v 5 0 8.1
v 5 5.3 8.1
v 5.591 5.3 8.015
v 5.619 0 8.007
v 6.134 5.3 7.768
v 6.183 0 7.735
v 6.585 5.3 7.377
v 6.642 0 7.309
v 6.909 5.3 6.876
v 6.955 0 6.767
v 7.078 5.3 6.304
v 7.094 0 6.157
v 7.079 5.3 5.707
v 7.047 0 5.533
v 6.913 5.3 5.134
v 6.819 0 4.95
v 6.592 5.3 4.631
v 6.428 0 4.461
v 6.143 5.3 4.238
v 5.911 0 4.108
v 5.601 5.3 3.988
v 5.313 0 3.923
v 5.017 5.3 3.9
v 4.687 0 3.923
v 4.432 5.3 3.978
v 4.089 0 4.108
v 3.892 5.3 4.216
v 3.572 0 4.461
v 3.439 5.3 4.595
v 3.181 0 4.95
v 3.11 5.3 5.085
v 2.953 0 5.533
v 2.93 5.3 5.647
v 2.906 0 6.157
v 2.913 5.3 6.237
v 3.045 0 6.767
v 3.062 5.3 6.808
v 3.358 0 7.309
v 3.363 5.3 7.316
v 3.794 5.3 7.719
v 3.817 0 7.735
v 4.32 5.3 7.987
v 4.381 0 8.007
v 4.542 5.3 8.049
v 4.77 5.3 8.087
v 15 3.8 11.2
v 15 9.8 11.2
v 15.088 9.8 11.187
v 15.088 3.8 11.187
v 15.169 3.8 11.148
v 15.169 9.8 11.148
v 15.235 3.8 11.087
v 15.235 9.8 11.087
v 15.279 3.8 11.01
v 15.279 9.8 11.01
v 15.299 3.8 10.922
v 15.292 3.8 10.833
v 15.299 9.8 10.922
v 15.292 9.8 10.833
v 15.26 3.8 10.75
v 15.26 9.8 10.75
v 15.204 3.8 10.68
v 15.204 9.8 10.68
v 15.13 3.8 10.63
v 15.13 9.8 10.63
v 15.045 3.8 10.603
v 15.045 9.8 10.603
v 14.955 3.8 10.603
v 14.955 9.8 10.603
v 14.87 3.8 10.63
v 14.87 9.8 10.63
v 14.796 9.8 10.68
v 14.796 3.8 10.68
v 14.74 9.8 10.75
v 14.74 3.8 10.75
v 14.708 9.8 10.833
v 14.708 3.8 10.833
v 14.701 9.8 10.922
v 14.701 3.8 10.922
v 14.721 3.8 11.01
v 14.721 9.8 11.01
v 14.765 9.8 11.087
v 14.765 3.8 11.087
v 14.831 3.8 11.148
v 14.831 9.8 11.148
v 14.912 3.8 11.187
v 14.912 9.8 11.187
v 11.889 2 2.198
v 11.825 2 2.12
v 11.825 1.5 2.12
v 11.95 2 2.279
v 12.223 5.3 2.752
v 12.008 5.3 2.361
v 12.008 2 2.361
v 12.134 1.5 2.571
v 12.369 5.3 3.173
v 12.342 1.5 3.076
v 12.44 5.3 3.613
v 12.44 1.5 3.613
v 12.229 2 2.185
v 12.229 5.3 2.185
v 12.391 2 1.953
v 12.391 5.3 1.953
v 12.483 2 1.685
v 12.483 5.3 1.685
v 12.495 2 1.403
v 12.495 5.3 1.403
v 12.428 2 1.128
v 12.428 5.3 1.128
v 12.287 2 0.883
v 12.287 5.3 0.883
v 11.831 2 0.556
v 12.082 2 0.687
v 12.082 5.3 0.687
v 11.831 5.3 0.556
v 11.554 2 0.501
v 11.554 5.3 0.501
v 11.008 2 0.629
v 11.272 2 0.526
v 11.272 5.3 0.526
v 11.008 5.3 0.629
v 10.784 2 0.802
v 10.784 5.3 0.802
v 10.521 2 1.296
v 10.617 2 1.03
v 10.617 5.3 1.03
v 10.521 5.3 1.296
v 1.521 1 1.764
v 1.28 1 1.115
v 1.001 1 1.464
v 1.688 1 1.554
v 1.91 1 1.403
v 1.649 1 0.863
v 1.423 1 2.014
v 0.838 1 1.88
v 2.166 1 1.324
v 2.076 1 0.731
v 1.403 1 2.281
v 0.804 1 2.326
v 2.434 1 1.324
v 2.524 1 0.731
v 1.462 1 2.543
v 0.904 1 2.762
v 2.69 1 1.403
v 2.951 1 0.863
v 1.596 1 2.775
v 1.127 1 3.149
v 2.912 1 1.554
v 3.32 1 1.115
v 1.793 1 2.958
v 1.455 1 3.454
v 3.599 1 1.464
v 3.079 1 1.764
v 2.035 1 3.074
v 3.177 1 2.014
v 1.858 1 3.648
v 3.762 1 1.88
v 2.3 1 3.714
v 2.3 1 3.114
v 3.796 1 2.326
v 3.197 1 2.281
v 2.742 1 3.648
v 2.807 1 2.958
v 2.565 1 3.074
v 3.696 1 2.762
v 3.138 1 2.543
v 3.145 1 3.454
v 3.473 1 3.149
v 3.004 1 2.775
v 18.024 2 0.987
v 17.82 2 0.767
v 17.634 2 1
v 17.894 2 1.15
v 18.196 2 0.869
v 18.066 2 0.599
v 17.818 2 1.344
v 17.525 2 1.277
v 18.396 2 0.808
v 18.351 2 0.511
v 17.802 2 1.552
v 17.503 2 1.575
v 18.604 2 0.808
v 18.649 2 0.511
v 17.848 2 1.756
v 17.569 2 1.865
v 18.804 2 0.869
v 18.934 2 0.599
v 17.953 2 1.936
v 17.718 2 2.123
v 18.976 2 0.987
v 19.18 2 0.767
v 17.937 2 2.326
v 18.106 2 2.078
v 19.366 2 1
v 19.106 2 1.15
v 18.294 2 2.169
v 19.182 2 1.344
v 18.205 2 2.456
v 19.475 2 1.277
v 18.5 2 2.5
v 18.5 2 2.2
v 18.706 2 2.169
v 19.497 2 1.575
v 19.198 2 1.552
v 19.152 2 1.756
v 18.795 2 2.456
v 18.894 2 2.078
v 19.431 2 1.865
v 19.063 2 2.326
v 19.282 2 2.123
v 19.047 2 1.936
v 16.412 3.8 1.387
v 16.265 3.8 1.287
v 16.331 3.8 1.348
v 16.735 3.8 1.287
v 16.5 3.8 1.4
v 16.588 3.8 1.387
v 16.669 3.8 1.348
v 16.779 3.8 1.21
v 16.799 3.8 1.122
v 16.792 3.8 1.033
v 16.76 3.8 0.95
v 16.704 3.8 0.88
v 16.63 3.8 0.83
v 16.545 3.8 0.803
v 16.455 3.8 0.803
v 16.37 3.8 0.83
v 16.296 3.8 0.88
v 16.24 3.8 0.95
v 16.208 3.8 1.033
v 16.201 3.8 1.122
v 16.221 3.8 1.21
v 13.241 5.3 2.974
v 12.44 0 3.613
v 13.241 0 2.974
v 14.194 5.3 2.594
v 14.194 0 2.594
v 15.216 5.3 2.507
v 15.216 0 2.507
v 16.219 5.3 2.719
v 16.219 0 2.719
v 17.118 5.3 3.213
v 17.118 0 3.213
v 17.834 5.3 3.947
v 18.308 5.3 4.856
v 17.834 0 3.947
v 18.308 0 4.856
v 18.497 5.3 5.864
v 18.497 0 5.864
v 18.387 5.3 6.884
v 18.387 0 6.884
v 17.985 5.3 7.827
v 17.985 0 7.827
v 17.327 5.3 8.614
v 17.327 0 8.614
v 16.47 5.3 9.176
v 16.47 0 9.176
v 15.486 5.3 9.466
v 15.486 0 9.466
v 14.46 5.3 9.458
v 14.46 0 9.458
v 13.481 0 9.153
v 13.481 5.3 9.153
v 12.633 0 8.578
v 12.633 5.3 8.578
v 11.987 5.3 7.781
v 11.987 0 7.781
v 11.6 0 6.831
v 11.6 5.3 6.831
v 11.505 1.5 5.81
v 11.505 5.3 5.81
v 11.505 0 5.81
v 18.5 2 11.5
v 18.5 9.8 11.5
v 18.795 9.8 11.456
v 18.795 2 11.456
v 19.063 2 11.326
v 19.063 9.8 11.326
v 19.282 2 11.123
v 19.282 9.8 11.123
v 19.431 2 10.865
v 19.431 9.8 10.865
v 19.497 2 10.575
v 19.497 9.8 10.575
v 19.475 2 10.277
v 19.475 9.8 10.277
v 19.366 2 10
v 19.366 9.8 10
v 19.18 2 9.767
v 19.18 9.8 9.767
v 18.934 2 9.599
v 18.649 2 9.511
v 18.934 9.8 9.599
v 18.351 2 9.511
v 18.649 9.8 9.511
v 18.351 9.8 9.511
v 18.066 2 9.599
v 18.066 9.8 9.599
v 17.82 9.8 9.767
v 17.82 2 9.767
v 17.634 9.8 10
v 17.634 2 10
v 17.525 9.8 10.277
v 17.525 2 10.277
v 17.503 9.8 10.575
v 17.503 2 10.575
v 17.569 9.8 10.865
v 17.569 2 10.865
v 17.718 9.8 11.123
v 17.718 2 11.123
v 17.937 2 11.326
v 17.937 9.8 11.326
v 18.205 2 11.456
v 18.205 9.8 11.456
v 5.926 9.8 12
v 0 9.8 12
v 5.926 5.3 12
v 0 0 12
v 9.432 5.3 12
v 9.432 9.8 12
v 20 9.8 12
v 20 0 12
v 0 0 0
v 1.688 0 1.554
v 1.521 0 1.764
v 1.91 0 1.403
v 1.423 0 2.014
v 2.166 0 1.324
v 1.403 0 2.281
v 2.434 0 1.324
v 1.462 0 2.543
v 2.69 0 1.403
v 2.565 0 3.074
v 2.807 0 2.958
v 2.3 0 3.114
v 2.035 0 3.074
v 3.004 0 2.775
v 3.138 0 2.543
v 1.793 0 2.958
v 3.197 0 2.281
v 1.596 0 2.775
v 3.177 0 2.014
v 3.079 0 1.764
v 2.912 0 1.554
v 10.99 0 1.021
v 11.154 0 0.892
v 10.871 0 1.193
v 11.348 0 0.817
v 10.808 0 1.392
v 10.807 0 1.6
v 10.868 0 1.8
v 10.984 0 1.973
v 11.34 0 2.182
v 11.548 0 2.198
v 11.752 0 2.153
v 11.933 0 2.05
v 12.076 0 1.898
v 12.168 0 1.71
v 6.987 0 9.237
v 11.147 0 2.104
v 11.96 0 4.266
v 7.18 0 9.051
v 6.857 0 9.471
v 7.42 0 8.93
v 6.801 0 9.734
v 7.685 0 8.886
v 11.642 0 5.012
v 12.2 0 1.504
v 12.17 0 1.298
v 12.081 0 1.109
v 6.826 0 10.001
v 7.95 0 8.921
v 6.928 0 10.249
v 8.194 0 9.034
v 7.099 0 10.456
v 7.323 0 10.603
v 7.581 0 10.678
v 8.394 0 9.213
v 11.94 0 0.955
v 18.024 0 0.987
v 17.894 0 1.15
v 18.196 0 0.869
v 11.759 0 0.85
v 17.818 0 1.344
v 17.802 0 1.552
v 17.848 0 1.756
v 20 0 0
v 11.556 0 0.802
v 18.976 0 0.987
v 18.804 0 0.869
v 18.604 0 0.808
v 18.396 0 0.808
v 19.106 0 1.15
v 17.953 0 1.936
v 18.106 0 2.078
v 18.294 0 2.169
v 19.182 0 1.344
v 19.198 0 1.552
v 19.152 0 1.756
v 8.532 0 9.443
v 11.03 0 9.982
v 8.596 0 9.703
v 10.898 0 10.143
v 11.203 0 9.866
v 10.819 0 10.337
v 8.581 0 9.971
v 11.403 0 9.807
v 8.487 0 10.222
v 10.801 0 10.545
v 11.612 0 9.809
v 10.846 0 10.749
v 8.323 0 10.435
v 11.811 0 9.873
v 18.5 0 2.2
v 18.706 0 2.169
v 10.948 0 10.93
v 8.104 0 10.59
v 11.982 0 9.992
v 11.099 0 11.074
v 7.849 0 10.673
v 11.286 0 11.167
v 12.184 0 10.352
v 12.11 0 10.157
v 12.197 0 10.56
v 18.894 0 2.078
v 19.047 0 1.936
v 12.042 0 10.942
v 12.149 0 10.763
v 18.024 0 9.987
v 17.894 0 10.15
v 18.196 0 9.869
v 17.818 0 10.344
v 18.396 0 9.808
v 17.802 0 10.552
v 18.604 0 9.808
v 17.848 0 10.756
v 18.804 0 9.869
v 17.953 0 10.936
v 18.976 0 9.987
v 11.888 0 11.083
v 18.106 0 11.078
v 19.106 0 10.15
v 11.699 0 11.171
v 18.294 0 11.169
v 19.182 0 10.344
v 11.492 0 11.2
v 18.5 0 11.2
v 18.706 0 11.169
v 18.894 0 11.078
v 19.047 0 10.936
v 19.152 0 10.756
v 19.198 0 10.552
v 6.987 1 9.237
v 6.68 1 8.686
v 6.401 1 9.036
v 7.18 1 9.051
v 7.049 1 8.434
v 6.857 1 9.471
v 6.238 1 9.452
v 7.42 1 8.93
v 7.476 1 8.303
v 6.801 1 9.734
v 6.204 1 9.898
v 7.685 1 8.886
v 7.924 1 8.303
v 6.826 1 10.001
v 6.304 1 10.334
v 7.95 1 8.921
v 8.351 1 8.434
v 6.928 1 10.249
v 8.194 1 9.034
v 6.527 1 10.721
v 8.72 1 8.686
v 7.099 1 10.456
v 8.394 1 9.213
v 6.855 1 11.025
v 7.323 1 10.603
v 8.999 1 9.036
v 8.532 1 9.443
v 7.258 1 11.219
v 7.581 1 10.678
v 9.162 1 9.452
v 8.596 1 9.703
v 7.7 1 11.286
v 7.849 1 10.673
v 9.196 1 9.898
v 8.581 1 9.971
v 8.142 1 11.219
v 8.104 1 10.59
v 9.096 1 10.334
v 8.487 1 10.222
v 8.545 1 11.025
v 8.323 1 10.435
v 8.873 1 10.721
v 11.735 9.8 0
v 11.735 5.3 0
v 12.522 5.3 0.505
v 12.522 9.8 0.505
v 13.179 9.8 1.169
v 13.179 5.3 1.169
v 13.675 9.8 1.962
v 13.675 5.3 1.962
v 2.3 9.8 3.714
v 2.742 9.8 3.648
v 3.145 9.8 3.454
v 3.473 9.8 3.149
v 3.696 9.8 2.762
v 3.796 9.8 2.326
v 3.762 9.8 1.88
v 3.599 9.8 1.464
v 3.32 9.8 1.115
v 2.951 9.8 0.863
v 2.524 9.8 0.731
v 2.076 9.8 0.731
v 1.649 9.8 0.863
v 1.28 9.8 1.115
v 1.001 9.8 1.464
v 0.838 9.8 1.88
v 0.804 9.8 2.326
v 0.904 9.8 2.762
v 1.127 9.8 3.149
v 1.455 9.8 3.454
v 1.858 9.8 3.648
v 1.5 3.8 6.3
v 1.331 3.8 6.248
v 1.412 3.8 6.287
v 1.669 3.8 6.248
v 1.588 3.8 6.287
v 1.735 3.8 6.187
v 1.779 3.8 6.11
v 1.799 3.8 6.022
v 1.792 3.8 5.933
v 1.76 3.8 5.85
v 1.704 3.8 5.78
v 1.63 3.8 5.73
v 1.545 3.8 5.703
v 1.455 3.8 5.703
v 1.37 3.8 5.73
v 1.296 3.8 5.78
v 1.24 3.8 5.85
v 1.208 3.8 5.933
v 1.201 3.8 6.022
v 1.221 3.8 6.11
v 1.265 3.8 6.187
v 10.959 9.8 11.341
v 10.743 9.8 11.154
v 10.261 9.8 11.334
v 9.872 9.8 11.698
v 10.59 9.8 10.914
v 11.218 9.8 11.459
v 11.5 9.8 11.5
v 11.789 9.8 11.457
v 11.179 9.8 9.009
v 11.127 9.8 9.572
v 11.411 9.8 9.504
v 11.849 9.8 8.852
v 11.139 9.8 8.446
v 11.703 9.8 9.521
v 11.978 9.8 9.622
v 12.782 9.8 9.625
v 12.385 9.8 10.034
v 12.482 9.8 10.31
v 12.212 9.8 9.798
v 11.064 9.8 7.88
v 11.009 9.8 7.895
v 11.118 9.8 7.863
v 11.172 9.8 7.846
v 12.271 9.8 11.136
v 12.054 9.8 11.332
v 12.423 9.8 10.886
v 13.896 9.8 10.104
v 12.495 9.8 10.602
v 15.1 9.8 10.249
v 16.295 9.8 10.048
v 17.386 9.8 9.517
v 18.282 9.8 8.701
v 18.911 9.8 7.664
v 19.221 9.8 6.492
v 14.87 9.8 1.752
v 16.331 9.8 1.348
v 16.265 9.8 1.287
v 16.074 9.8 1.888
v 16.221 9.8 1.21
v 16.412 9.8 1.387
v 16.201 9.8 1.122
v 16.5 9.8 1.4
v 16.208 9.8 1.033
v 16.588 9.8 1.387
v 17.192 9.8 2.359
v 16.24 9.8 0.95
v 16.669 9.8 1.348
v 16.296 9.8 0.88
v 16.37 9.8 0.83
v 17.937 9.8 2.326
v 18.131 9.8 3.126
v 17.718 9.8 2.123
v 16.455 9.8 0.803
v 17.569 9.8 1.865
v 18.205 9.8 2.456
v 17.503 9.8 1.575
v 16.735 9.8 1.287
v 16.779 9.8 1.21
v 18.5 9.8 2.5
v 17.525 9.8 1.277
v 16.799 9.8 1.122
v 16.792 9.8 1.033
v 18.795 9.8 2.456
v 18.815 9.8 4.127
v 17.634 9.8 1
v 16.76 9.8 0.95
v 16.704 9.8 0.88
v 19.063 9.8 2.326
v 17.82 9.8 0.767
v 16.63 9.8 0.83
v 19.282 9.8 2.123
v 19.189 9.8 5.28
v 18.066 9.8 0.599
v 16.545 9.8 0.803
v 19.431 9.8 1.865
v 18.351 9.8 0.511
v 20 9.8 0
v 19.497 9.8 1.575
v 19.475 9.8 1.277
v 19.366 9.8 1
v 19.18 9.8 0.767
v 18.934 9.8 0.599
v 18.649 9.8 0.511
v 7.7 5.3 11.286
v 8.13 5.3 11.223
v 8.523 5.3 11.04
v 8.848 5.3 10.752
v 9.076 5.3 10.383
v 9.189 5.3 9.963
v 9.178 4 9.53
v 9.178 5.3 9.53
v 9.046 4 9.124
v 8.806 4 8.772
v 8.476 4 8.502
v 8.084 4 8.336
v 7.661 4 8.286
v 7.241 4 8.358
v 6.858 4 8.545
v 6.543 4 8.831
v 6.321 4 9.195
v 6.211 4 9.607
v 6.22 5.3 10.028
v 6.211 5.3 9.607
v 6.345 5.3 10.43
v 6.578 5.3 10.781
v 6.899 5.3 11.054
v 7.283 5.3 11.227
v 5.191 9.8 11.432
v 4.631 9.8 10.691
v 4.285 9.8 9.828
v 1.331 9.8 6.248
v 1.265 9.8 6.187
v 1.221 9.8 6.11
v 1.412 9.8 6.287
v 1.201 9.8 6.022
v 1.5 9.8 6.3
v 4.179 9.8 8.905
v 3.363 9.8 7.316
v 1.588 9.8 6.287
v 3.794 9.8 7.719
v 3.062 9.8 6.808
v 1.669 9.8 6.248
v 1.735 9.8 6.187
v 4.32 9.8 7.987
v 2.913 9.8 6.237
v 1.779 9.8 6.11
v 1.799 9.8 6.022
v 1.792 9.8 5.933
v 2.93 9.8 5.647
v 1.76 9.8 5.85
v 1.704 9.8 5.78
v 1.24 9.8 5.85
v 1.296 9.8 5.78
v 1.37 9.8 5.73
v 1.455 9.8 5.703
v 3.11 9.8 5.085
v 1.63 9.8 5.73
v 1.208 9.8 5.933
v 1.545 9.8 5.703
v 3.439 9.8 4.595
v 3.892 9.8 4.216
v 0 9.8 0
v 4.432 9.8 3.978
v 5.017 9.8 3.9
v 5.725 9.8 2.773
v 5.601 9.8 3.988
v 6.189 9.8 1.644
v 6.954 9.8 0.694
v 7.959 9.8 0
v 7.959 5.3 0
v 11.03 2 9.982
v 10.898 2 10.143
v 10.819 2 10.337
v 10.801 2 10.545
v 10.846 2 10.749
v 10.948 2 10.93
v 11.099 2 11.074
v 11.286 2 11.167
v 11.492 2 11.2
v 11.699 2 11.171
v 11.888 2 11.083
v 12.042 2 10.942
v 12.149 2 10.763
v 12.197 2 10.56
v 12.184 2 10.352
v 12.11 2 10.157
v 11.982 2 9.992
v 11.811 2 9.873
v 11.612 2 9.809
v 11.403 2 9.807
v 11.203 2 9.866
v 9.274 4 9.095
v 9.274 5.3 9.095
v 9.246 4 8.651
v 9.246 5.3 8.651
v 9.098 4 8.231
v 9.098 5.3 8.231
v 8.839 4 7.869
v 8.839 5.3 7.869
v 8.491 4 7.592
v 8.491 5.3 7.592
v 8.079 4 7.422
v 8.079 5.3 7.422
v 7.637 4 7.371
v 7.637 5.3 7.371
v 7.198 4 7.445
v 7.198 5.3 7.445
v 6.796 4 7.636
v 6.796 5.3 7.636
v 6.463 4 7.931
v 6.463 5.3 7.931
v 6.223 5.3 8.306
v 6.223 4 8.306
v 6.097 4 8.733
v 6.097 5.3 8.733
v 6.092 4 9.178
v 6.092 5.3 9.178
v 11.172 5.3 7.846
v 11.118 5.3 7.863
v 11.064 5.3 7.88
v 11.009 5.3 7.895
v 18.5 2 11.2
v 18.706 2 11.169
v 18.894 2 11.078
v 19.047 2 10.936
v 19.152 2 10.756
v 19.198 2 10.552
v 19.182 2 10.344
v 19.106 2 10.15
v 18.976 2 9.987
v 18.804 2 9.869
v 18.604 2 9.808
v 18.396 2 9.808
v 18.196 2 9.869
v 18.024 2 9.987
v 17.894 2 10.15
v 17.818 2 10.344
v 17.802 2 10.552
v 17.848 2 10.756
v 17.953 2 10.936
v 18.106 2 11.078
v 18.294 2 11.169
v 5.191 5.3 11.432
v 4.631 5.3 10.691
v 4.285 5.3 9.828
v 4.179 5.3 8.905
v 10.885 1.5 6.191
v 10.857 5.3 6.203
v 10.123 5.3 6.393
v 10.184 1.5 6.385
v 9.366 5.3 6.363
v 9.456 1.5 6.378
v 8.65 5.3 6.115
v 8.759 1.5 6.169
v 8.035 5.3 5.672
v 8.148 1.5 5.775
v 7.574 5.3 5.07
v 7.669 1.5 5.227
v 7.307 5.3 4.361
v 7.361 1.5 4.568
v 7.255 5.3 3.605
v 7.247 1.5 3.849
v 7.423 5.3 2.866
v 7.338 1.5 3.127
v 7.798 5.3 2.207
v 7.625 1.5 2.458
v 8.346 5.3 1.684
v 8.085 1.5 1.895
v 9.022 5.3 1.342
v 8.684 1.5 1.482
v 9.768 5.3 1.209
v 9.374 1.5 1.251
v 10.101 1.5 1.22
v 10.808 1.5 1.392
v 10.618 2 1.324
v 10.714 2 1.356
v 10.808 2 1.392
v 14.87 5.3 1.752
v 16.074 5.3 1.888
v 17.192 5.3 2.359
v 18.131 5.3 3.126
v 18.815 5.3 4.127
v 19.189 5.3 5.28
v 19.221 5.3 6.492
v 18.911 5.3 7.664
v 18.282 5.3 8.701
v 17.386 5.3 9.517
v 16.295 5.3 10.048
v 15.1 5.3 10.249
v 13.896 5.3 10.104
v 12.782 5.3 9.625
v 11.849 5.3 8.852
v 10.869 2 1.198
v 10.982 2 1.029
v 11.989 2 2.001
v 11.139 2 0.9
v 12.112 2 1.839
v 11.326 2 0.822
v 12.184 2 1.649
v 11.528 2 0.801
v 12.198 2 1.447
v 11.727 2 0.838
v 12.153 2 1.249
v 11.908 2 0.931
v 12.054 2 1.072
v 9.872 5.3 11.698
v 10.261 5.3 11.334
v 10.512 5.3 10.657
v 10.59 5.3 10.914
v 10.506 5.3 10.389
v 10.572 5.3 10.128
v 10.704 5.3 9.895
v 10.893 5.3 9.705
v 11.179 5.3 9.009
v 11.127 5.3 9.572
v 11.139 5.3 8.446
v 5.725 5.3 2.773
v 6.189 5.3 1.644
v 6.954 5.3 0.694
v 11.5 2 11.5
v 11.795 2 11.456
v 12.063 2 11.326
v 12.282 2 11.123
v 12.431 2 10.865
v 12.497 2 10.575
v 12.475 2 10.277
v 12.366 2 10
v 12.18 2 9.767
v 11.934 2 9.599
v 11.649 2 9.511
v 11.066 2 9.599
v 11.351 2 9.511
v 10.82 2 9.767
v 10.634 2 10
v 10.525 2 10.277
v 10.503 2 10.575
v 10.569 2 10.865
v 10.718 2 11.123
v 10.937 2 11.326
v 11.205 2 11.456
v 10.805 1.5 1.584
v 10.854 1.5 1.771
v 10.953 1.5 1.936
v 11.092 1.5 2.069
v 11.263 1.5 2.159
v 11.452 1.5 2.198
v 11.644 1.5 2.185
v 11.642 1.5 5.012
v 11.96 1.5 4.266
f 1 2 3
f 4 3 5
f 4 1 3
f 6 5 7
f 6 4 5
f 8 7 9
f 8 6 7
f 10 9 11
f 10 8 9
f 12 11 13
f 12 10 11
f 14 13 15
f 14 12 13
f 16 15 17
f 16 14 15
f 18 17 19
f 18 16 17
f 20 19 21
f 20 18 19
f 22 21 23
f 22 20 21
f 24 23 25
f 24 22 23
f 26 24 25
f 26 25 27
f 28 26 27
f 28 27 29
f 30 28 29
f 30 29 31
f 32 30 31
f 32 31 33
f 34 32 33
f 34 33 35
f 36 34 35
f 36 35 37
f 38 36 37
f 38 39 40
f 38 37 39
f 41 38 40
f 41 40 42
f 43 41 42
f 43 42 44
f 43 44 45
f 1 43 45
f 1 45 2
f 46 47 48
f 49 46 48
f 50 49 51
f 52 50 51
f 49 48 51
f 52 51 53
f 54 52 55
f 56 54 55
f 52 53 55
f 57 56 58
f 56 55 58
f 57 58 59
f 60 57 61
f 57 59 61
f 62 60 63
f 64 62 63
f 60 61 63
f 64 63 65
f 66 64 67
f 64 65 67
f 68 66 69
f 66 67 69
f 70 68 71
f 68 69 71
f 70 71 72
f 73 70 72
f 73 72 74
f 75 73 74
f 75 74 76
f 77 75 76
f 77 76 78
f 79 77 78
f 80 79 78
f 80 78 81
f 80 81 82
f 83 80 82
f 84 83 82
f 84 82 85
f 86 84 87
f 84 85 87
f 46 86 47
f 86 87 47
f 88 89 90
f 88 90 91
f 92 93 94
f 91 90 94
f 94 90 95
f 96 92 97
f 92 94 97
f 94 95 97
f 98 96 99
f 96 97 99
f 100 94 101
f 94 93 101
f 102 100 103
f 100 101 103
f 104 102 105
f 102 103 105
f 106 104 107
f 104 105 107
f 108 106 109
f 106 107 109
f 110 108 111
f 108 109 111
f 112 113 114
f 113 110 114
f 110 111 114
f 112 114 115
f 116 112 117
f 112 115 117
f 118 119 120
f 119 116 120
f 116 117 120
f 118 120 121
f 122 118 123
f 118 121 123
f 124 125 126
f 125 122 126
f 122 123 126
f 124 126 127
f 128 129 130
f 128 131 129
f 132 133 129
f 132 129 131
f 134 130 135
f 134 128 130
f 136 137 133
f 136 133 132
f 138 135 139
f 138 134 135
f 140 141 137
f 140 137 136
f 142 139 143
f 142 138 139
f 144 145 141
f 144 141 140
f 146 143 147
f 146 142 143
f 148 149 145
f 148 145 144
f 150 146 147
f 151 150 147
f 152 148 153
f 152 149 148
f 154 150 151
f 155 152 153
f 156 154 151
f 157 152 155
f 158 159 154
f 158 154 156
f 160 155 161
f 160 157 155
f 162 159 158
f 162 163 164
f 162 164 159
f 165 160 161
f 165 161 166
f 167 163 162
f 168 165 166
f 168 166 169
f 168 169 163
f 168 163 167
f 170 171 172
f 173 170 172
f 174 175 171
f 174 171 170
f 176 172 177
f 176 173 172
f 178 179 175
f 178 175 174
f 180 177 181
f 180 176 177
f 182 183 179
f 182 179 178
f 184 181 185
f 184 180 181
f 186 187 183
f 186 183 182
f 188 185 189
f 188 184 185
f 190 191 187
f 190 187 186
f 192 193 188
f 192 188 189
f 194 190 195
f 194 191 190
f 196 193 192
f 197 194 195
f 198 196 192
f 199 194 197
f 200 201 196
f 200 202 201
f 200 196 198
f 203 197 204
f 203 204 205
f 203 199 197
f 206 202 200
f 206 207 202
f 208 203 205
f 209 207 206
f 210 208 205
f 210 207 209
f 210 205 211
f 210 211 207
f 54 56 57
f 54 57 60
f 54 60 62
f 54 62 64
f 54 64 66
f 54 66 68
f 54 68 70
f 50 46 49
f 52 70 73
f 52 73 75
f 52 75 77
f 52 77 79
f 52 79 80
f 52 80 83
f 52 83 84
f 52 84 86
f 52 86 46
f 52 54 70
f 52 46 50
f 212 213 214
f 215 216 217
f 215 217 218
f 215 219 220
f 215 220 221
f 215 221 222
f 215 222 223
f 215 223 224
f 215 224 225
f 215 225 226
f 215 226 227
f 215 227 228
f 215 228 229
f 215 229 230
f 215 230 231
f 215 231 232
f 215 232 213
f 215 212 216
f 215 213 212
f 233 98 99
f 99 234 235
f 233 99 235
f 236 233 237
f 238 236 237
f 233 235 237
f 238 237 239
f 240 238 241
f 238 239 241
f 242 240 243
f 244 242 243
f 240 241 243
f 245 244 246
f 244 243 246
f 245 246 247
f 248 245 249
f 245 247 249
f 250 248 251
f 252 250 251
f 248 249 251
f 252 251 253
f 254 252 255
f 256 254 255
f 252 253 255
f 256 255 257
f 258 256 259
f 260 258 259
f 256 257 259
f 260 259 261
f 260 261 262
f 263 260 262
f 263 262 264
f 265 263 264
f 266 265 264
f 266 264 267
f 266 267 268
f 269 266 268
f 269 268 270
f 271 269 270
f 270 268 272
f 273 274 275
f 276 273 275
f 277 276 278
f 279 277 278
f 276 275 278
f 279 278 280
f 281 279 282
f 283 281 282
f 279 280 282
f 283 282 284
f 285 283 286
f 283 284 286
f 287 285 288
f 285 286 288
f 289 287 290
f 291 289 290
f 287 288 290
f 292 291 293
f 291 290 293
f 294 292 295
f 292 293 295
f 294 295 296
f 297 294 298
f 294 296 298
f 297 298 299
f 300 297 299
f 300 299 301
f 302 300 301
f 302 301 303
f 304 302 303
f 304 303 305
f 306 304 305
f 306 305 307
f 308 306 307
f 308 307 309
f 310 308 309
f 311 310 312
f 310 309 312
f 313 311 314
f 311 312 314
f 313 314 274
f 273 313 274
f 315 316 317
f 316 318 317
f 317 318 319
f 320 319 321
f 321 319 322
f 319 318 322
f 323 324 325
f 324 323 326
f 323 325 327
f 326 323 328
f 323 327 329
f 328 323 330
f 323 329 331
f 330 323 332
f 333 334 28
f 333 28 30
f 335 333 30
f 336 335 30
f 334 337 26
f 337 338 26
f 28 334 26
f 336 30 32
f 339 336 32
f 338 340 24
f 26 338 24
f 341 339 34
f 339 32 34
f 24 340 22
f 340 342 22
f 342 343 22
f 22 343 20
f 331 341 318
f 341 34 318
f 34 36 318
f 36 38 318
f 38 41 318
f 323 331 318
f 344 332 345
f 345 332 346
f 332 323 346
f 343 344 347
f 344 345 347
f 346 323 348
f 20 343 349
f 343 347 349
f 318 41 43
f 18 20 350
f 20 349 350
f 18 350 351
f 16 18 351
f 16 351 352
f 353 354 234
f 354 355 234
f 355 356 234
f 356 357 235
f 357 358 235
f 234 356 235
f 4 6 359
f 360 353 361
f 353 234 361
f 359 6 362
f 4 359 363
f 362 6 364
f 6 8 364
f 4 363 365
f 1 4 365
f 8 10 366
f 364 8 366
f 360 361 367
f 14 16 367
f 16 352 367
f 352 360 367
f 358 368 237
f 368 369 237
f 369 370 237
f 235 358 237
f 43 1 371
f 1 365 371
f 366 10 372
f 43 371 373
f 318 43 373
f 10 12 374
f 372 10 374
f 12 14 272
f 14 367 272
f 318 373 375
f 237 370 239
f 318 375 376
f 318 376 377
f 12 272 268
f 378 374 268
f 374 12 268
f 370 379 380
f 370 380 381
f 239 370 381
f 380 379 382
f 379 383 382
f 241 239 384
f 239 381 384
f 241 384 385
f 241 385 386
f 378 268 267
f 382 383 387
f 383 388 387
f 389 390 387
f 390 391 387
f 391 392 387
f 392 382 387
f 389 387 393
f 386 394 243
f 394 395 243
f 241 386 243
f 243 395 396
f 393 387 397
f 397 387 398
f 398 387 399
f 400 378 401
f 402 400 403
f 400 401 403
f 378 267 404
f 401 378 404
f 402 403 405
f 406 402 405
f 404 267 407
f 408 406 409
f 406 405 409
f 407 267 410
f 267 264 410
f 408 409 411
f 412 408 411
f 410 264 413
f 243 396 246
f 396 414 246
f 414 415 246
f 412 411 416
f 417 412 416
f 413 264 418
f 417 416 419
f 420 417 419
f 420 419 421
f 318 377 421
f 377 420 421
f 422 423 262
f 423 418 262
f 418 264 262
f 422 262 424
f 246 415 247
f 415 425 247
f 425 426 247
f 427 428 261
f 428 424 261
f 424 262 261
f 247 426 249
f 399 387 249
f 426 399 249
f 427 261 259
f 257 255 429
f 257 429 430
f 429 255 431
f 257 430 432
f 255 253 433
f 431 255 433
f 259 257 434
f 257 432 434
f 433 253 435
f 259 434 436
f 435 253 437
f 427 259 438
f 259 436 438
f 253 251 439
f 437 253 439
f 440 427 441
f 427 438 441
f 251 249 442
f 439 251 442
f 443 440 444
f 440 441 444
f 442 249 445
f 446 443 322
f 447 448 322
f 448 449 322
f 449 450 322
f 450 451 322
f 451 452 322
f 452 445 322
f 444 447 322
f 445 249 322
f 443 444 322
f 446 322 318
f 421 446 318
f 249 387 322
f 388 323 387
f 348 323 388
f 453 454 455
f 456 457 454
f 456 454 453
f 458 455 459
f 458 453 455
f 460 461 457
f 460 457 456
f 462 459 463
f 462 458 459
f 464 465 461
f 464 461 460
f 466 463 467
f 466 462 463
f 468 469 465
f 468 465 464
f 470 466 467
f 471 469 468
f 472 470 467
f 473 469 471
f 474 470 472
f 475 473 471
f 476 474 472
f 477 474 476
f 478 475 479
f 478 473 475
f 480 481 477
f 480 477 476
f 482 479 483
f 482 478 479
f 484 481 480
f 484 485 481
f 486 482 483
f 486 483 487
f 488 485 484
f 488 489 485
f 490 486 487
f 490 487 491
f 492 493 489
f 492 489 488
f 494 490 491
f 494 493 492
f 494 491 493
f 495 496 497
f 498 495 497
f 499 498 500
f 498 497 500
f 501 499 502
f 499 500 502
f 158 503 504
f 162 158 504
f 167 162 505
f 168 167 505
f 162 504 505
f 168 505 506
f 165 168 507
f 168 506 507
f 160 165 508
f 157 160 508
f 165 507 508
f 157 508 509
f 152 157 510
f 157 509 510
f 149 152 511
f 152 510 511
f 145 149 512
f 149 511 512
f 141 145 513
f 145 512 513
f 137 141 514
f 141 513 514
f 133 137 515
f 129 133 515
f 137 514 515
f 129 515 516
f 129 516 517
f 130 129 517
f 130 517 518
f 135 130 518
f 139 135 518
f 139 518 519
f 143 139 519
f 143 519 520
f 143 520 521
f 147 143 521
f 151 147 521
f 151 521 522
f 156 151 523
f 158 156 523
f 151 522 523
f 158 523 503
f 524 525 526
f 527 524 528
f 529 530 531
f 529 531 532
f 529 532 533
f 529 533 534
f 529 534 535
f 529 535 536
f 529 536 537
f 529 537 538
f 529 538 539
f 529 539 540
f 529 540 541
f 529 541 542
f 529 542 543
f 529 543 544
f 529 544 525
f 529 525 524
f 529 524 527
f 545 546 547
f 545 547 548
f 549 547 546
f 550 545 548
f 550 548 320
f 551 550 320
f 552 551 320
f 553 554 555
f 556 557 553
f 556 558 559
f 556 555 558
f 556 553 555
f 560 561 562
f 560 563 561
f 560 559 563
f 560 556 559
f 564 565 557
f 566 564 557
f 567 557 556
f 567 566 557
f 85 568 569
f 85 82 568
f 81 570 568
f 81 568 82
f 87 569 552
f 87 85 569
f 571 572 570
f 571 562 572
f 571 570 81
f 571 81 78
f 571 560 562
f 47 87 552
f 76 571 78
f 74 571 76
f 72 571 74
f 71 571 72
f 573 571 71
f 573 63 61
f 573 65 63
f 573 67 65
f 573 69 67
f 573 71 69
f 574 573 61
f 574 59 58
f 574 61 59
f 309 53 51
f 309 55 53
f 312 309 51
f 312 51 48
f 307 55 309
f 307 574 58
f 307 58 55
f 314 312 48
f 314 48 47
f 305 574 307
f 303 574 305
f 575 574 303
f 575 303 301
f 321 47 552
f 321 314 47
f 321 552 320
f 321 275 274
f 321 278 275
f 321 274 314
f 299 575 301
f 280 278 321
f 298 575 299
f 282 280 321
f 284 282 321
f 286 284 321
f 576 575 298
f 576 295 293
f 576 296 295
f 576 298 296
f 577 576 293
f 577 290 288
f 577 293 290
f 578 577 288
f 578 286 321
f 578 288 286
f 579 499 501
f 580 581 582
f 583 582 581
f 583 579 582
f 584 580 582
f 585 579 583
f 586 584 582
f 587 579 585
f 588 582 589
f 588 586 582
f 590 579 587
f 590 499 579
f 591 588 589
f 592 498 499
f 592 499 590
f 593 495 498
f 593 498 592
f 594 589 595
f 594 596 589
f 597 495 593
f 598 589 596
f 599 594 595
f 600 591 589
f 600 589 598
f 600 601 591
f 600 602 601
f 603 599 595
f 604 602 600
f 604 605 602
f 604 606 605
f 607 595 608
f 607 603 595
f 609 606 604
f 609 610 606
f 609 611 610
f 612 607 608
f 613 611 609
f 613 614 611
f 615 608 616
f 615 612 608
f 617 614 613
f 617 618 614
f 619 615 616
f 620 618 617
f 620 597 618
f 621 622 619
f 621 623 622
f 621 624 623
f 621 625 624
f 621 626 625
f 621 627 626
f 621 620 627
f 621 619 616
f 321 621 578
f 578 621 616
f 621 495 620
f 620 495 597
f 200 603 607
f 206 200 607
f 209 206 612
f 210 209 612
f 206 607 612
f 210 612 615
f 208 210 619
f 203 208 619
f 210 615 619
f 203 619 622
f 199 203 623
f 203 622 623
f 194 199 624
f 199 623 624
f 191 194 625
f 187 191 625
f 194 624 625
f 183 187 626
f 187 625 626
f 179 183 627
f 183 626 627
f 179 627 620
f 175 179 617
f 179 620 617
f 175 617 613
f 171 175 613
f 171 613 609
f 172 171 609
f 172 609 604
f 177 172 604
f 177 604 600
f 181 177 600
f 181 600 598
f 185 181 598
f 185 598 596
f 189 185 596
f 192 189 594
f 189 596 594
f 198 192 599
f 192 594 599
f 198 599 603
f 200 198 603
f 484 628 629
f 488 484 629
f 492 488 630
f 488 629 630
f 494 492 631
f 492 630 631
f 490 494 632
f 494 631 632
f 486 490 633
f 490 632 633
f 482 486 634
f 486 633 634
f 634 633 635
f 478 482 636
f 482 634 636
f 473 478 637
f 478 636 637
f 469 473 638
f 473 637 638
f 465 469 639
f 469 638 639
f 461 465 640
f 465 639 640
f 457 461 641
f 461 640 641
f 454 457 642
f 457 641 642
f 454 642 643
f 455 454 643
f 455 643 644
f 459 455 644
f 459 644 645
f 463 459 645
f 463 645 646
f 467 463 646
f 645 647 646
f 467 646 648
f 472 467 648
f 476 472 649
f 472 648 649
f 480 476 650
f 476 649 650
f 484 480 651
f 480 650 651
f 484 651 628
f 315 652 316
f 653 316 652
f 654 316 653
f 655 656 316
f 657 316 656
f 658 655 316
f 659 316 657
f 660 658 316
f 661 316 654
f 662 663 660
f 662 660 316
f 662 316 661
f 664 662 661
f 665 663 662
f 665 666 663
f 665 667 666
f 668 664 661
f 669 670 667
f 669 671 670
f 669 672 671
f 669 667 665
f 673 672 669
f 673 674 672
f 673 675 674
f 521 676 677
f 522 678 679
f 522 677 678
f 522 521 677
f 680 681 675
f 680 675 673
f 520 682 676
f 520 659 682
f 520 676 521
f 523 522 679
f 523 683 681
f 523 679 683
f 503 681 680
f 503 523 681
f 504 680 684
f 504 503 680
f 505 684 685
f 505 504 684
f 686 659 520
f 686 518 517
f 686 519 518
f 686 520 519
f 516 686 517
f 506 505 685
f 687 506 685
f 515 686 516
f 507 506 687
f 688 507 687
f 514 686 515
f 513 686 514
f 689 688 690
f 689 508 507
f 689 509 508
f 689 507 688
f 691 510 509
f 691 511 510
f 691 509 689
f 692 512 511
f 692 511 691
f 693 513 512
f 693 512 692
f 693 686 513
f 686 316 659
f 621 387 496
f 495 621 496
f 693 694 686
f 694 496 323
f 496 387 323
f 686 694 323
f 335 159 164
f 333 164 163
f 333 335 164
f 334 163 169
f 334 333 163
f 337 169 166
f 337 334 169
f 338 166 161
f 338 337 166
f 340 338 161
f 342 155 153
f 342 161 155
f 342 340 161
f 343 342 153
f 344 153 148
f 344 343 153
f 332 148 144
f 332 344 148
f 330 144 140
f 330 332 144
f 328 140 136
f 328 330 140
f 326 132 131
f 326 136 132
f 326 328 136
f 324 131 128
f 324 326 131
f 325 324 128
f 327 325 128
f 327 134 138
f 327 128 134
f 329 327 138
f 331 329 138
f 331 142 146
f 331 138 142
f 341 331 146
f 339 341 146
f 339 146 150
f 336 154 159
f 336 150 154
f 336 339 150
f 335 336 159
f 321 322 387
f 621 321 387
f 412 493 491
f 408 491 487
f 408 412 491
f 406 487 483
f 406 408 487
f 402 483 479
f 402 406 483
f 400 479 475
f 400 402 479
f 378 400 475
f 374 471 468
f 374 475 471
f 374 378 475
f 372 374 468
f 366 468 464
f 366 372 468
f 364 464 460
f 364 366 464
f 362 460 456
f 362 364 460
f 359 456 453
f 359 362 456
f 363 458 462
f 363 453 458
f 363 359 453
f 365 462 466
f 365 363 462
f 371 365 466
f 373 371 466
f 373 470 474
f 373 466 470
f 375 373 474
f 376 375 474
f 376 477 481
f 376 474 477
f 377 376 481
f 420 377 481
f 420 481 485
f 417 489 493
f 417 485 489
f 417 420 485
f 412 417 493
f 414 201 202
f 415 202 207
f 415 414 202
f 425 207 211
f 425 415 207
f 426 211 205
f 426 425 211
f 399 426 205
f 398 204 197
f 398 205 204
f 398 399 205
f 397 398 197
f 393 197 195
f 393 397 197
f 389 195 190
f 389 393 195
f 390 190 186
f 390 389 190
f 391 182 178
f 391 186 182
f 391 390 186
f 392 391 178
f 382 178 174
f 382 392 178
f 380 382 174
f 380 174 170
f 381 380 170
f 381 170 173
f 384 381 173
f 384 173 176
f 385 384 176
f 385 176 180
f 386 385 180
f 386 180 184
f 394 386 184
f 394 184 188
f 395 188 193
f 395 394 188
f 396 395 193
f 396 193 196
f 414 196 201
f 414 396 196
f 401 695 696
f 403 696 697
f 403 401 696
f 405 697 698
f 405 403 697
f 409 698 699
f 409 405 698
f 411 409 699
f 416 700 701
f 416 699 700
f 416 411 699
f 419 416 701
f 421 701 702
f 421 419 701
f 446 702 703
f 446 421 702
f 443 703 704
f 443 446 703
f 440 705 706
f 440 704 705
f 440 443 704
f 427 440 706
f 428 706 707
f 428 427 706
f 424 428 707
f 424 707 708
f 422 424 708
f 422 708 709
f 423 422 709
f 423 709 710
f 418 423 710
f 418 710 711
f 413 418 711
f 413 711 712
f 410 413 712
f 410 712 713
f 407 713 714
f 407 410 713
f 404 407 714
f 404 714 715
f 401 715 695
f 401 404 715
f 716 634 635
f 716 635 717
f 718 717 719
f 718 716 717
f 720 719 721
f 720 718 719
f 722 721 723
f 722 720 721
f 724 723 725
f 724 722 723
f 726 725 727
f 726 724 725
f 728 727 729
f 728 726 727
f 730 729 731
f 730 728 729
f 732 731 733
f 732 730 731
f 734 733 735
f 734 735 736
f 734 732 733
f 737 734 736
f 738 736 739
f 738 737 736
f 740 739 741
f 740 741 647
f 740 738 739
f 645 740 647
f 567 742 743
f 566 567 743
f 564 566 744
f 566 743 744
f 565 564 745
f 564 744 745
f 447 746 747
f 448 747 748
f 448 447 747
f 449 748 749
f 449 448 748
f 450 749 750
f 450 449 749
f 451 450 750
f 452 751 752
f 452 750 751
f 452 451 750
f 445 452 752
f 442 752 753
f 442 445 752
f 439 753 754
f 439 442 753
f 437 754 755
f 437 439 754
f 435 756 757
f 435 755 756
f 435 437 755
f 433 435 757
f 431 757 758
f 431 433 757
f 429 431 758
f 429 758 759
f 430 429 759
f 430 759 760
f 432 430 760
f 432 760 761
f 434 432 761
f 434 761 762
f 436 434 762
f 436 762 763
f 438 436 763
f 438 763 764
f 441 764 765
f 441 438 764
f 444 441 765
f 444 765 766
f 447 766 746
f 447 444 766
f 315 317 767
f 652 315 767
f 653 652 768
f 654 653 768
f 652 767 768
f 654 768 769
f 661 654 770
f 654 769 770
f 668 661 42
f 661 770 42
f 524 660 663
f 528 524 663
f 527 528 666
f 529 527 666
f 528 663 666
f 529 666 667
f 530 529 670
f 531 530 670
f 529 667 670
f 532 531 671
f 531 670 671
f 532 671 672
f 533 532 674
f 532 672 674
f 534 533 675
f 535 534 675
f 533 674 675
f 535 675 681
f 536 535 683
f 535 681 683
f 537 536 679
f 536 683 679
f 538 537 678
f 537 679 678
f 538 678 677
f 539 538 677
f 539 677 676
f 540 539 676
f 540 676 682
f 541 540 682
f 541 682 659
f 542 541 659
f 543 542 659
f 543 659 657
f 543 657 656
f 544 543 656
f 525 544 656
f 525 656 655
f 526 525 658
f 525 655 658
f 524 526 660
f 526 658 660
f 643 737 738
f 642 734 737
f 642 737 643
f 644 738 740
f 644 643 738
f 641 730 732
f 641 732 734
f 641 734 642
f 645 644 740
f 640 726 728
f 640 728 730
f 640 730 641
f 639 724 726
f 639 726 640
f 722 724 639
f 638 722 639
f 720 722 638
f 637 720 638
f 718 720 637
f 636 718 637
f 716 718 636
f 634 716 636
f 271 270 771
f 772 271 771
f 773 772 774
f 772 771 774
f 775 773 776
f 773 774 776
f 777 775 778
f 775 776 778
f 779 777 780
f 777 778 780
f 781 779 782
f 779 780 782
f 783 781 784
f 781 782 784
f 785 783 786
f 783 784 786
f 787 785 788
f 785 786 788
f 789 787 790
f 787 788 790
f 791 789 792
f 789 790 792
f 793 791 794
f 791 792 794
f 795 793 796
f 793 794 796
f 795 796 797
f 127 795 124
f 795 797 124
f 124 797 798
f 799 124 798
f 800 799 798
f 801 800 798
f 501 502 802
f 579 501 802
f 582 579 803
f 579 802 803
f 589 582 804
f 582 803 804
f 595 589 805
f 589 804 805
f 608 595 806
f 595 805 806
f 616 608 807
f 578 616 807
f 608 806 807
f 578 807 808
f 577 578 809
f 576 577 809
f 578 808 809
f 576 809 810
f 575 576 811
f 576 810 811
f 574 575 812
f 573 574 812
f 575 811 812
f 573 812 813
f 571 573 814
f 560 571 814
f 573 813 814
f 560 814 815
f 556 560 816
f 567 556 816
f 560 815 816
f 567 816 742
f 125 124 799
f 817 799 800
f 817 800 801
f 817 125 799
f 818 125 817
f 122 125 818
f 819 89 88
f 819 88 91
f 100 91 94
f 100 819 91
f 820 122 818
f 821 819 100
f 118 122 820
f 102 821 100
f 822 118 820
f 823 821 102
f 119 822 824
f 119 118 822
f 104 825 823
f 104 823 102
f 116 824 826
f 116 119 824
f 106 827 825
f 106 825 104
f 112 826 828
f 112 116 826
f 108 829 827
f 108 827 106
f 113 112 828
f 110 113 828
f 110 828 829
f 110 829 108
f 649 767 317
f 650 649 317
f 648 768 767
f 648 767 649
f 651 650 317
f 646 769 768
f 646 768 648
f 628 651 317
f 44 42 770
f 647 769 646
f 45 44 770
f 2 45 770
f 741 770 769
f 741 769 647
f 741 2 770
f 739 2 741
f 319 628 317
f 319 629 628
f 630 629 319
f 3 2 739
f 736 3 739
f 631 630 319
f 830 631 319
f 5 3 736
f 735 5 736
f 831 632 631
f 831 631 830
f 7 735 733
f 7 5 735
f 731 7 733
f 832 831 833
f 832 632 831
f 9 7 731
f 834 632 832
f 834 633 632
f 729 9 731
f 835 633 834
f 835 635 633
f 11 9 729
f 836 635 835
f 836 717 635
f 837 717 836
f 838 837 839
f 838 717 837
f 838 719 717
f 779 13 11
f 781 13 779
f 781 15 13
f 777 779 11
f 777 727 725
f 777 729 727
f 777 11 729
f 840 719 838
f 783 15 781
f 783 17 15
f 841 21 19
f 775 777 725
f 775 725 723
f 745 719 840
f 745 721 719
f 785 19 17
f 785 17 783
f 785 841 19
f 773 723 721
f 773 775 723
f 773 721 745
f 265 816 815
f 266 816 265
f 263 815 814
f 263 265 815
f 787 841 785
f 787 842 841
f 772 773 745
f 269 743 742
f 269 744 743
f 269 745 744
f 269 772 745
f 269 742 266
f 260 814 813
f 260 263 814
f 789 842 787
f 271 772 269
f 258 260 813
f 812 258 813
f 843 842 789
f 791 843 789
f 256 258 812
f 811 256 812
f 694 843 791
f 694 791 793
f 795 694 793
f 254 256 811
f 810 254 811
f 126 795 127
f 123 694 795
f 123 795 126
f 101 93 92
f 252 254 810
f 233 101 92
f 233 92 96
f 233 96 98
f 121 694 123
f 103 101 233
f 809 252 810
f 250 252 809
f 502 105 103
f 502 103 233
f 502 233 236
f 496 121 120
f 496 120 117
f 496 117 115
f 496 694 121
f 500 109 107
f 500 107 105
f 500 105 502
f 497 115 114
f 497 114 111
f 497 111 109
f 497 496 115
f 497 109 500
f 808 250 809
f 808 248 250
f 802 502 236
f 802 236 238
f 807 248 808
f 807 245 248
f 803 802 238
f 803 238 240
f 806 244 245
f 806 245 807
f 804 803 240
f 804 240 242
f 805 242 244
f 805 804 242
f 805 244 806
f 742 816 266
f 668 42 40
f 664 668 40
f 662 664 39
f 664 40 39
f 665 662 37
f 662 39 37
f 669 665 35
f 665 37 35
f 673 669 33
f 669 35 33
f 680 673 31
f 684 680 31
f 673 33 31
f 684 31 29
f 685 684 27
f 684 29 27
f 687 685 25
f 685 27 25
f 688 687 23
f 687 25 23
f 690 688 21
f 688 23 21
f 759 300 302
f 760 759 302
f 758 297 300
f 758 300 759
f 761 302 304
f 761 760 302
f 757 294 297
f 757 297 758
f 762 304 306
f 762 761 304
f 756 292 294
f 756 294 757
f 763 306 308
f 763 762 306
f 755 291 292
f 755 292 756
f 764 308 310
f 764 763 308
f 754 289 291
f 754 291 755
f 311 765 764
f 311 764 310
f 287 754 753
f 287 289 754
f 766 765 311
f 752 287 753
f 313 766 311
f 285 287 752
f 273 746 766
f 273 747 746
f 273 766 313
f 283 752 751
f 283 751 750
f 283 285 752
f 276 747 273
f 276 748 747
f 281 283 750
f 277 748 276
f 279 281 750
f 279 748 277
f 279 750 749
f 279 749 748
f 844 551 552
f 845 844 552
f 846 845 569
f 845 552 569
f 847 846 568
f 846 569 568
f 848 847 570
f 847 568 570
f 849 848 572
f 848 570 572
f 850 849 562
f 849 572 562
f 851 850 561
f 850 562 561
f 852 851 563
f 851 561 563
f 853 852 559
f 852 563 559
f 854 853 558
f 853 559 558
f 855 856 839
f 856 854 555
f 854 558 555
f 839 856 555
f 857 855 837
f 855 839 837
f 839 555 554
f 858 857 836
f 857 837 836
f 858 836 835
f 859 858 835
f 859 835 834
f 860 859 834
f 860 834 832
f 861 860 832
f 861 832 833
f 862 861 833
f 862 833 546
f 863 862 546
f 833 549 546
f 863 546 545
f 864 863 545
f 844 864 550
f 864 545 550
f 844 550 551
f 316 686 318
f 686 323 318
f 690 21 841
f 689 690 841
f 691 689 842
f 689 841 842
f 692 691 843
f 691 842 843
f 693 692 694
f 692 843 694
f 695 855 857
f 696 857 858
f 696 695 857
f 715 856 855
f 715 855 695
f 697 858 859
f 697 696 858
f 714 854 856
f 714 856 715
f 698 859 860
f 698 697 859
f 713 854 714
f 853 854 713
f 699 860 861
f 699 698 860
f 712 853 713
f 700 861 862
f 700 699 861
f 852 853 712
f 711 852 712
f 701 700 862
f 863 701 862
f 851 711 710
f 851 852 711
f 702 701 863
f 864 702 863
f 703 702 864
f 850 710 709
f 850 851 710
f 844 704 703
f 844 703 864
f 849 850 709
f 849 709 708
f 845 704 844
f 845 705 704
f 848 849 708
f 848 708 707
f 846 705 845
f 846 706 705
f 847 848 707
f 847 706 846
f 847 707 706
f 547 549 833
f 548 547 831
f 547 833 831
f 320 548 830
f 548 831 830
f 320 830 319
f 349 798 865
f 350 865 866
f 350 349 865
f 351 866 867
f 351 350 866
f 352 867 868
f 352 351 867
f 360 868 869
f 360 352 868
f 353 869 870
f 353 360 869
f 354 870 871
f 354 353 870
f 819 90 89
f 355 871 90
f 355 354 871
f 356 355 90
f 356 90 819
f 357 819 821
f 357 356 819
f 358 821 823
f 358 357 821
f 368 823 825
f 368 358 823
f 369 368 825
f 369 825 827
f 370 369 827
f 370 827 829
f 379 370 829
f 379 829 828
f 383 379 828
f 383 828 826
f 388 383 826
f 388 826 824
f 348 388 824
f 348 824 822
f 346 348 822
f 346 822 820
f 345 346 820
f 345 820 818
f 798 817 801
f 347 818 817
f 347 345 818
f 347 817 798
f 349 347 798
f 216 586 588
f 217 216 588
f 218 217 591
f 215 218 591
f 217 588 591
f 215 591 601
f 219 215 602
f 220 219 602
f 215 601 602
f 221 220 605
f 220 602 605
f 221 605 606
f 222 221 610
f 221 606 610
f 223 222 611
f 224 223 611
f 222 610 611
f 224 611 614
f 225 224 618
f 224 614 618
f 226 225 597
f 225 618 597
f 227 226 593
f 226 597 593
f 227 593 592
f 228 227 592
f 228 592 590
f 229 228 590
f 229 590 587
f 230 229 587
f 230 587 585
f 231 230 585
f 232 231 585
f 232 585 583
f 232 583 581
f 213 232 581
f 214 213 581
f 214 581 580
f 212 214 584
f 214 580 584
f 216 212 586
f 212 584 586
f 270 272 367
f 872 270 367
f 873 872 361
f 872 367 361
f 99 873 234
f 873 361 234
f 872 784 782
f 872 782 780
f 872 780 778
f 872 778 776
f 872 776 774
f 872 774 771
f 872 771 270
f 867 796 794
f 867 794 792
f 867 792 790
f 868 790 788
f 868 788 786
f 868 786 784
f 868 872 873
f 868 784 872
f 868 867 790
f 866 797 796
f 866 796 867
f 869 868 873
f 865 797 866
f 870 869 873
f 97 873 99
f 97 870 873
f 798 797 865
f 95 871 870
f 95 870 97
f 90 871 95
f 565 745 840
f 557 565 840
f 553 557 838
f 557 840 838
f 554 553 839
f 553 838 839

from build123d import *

# Parameters (mm, degrees)
SKETCH_1_W          = 20
SKETCH_1_H          = 12
SKETCH_1_R          = 1.6
SKETCH_1_R_2        = 2.1
EXTRUDE_1_DEPTH     = 5.3
EXTRUDE_2_DEPTH     = 1.5
SKETCH_1_5_R        = 1.6
EXTRUDE_3_DEPTH     = 4
EXTRUDE_START       = 5.3
EXTRUDE_4_DEPTH     = 4.5
SKETCH_2_R          = 0.9
SKETCH_2_R_2        = 0.7
CUT_EXTRUDE_1_DEPTH = 26.299011838
CUT_EXTRUDE_START   = 9.8
SKETCH_2_3_R        = 1.5
CUT_EXTRUDE_2_DEPTH = 8.8
SKETCH_2_4_R        = 1
CUT_EXTRUDE_3_DEPTH = 7.8
SKETCH_2_5_R        = 0.3
CUT_EXTRUDE_4_DEPTH = 6


with BuildPart() as part:
    # 草图1 → 凸台-拉伸1 (new body)
    with BuildSketch(Plane(origin=(0, 0, 0), x_dir=(1, 0, 0), z_dir=(0, 1, 0))):
        with Locations((10, -6)):
            Rectangle(SKETCH_1_W, SKETCH_1_H)
        with BuildLine():
            ThreePointArc((12.439835428, -3.613463312), (18.220575086, -7.370363498), (11.50515478, -5.81011348))
            ThreePointArc((11.50515478, -5.81011348), (7.454652656, -2.789434091), (12.439835428, -3.613463312))
        make_face(mode=Mode.SUBTRACT)
        with Locations(Location((7.678736094, -8.970584613, 0), (0, 0, 270))):
            Circle(SKETCH_1_R, mode=Mode.SUBTRACT)
        with Locations(Location((5, -6, 0), (0, 0, 270))):
            Circle(SKETCH_1_R_2, mode=Mode.SUBTRACT)
    extrude(amount=EXTRUDE_1_DEPTH)

    # 草图1<4> → 凸台-拉伸2 (add)
    with BuildSketch(Plane(origin=(0, 0, 0), x_dir=(1, 0, 0), z_dir=(0, 1, 0))):
        with BuildLine():
            ThreePointArc((11.50515478, -5.81011348), (11.779424914, -4.629636502), (12.439835428, -3.613463312))
            ThreePointArc((12.439835428, -3.613463312), (7.454652656, -2.789434091), (11.50515478, -5.81011348))
        make_face()
    extrude(amount=EXTRUDE_2_DEPTH)

    # 草图1<5> → 凸台-拉伸3 (add)
    with BuildSketch(Plane(origin=(0, 0, 0), x_dir=(1, 0, 0), z_dir=(0, 1, 0))):
        with Locations(Location((7.678736094, -8.970584613, 0), (0, 0, 270))):
            Circle(SKETCH_1_5_R)
    extrude(amount=EXTRUDE_3_DEPTH)

    # 草图1<6> → 凸台-拉伸4 (add)
    with BuildSketch(Plane(origin=(0, 0, 0), x_dir=(1, 0, 0), z_dir=(0, 1, 0)).offset(EXTRUDE_START)):
        with BuildLine():
            Line((7.958677072, 0), (0, 0))
            Line((0, 0), (0, -12))
            Line((0, -12), (5.925840657, -12))
            ThreePointArc((5.925840657, -12), (4.429268792, -10.270954659), (4.319841502, -7.986802561))
            ThreePointArc((4.319841502, -7.986802561), (3.000111311, -5.359340003), (5.600909971, -3.987810345))
            ThreePointArc((5.600909971, -3.987810345), (6.188678117, -1.644412009), (7.958677072, 0))
        make_face()
        with BuildLine():
            Line((20, 0), (11.735482653, 0))
            ThreePointArc((11.735482653, 0), (12.869036074, -0.819060885), (13.675372646, -1.961700559))
            ThreePointArc((13.675372646, -1.961700559), (18.910698319, -7.664012819), (11.171707216, -7.845717845))
            ThreePointArc((11.171707216, -7.845717845), (11.090844977, -7.871351024), (11.009487245, -7.895365208))
            ThreePointArc((11.009487245, -7.895365208), (10.945672327, -10.226422042), (9.43163153, -12))
            Line((9.43163153, -12), (20, -12))
            Line((20, -12), (20, 0))
        make_face()
    extrude(amount=EXTRUDE_4_DEPTH)

    # 草图2 → 切除-拉伸1 (cut, through all)
    with BuildSketch(Plane(origin=(0, 0, 0), x_dir=(1, 0, 0), z_dir=(0, 1, 0))):
        with Locations(Location((2.3, -2.214171161, 0), (0, 0, 270))):
            Circle(SKETCH_2_R)
        with Locations(Location((7.7, -9.785828839, 0), (0, 0, 313.840961576))):
            Circle(SKETCH_2_R)
        with Locations(Location((11.5, -1.5, 0), (0, 0, 171.097944201))):
            Circle(SKETCH_2_R_2)
        with Locations(Location((18.5, -10.5, 0), (0, 0, 270))):
            Circle(SKETCH_2_R_2)
        with Locations(Location((18.5, -1.5, 0), (0, 0, 270))):
            Circle(SKETCH_2_R_2)
        with Locations(Location((11.5, -10.5, 0), (0, 0, 132.232284036))):
            Circle(SKETCH_2_R_2)
    extrude(amount=CUT_EXTRUDE_1_DEPTH, mode=Mode.SUBTRACT)

    # 草图2<3> → 切除-拉伸2 (cut)
    with BuildSketch(Plane(origin=(0, 0, 0), x_dir=(1, 0, 0), z_dir=(0, 1, 0)).offset(CUT_EXTRUDE_START)):
        with Locations(Location((2.3, -2.214171161, 0), (0, 0, 270))):
            Circle(SKETCH_2_3_R)
        with Locations(Location((7.7, -9.785828839, 0), (0, 0, 270))):
            Circle(SKETCH_2_3_R)
    extrude(amount=-CUT_EXTRUDE_2_DEPTH, mode=Mode.SUBTRACT)

    # 草图2<4> → 切除-拉伸3 (cut)
    with BuildSketch(Plane(origin=(0, 0, 0), x_dir=(1, 0, 0), z_dir=(0, 1, 0)).offset(CUT_EXTRUDE_START)):
        with Locations((11.5, -1.5)):
            Circle(SKETCH_2_4_R)
        with Locations(Location((18.5, -10.5, 0), (0, 0, 270))):
            Circle(SKETCH_2_4_R)
        with Locations(Location((18.5, -1.5, 0), (0, 0, 270))):
            Circle(SKETCH_2_4_R)
        with Locations(Location((11.5, -10.5, 0), (0, 0, 270))):
            Circle(SKETCH_2_4_R)
    extrude(amount=-CUT_EXTRUDE_3_DEPTH, mode=Mode.SUBTRACT)

    # 草图2<5> → 切除-拉伸4 (cut)
    with BuildSketch(Plane(origin=(0, 0, 0), x_dir=(1, 0, 0), z_dir=(0, 1, 0)).offset(CUT_EXTRUDE_START)):
        with Locations(Location((1.5, -6, 0), (0, 0, 270))):
            Circle(SKETCH_2_5_R)
        with Locations(Location((16.5, -1.1, 0), (0, 0, 270))):
            Circle(SKETCH_2_5_R)
        with Locations(Location((15, -10.9, 0), (0, 0, 270))):
            Circle(SKETCH_2_5_R)
    extrude(amount=-CUT_EXTRUDE_4_DEPTH, mode=Mode.SUBTRACT)


solid = part.part
